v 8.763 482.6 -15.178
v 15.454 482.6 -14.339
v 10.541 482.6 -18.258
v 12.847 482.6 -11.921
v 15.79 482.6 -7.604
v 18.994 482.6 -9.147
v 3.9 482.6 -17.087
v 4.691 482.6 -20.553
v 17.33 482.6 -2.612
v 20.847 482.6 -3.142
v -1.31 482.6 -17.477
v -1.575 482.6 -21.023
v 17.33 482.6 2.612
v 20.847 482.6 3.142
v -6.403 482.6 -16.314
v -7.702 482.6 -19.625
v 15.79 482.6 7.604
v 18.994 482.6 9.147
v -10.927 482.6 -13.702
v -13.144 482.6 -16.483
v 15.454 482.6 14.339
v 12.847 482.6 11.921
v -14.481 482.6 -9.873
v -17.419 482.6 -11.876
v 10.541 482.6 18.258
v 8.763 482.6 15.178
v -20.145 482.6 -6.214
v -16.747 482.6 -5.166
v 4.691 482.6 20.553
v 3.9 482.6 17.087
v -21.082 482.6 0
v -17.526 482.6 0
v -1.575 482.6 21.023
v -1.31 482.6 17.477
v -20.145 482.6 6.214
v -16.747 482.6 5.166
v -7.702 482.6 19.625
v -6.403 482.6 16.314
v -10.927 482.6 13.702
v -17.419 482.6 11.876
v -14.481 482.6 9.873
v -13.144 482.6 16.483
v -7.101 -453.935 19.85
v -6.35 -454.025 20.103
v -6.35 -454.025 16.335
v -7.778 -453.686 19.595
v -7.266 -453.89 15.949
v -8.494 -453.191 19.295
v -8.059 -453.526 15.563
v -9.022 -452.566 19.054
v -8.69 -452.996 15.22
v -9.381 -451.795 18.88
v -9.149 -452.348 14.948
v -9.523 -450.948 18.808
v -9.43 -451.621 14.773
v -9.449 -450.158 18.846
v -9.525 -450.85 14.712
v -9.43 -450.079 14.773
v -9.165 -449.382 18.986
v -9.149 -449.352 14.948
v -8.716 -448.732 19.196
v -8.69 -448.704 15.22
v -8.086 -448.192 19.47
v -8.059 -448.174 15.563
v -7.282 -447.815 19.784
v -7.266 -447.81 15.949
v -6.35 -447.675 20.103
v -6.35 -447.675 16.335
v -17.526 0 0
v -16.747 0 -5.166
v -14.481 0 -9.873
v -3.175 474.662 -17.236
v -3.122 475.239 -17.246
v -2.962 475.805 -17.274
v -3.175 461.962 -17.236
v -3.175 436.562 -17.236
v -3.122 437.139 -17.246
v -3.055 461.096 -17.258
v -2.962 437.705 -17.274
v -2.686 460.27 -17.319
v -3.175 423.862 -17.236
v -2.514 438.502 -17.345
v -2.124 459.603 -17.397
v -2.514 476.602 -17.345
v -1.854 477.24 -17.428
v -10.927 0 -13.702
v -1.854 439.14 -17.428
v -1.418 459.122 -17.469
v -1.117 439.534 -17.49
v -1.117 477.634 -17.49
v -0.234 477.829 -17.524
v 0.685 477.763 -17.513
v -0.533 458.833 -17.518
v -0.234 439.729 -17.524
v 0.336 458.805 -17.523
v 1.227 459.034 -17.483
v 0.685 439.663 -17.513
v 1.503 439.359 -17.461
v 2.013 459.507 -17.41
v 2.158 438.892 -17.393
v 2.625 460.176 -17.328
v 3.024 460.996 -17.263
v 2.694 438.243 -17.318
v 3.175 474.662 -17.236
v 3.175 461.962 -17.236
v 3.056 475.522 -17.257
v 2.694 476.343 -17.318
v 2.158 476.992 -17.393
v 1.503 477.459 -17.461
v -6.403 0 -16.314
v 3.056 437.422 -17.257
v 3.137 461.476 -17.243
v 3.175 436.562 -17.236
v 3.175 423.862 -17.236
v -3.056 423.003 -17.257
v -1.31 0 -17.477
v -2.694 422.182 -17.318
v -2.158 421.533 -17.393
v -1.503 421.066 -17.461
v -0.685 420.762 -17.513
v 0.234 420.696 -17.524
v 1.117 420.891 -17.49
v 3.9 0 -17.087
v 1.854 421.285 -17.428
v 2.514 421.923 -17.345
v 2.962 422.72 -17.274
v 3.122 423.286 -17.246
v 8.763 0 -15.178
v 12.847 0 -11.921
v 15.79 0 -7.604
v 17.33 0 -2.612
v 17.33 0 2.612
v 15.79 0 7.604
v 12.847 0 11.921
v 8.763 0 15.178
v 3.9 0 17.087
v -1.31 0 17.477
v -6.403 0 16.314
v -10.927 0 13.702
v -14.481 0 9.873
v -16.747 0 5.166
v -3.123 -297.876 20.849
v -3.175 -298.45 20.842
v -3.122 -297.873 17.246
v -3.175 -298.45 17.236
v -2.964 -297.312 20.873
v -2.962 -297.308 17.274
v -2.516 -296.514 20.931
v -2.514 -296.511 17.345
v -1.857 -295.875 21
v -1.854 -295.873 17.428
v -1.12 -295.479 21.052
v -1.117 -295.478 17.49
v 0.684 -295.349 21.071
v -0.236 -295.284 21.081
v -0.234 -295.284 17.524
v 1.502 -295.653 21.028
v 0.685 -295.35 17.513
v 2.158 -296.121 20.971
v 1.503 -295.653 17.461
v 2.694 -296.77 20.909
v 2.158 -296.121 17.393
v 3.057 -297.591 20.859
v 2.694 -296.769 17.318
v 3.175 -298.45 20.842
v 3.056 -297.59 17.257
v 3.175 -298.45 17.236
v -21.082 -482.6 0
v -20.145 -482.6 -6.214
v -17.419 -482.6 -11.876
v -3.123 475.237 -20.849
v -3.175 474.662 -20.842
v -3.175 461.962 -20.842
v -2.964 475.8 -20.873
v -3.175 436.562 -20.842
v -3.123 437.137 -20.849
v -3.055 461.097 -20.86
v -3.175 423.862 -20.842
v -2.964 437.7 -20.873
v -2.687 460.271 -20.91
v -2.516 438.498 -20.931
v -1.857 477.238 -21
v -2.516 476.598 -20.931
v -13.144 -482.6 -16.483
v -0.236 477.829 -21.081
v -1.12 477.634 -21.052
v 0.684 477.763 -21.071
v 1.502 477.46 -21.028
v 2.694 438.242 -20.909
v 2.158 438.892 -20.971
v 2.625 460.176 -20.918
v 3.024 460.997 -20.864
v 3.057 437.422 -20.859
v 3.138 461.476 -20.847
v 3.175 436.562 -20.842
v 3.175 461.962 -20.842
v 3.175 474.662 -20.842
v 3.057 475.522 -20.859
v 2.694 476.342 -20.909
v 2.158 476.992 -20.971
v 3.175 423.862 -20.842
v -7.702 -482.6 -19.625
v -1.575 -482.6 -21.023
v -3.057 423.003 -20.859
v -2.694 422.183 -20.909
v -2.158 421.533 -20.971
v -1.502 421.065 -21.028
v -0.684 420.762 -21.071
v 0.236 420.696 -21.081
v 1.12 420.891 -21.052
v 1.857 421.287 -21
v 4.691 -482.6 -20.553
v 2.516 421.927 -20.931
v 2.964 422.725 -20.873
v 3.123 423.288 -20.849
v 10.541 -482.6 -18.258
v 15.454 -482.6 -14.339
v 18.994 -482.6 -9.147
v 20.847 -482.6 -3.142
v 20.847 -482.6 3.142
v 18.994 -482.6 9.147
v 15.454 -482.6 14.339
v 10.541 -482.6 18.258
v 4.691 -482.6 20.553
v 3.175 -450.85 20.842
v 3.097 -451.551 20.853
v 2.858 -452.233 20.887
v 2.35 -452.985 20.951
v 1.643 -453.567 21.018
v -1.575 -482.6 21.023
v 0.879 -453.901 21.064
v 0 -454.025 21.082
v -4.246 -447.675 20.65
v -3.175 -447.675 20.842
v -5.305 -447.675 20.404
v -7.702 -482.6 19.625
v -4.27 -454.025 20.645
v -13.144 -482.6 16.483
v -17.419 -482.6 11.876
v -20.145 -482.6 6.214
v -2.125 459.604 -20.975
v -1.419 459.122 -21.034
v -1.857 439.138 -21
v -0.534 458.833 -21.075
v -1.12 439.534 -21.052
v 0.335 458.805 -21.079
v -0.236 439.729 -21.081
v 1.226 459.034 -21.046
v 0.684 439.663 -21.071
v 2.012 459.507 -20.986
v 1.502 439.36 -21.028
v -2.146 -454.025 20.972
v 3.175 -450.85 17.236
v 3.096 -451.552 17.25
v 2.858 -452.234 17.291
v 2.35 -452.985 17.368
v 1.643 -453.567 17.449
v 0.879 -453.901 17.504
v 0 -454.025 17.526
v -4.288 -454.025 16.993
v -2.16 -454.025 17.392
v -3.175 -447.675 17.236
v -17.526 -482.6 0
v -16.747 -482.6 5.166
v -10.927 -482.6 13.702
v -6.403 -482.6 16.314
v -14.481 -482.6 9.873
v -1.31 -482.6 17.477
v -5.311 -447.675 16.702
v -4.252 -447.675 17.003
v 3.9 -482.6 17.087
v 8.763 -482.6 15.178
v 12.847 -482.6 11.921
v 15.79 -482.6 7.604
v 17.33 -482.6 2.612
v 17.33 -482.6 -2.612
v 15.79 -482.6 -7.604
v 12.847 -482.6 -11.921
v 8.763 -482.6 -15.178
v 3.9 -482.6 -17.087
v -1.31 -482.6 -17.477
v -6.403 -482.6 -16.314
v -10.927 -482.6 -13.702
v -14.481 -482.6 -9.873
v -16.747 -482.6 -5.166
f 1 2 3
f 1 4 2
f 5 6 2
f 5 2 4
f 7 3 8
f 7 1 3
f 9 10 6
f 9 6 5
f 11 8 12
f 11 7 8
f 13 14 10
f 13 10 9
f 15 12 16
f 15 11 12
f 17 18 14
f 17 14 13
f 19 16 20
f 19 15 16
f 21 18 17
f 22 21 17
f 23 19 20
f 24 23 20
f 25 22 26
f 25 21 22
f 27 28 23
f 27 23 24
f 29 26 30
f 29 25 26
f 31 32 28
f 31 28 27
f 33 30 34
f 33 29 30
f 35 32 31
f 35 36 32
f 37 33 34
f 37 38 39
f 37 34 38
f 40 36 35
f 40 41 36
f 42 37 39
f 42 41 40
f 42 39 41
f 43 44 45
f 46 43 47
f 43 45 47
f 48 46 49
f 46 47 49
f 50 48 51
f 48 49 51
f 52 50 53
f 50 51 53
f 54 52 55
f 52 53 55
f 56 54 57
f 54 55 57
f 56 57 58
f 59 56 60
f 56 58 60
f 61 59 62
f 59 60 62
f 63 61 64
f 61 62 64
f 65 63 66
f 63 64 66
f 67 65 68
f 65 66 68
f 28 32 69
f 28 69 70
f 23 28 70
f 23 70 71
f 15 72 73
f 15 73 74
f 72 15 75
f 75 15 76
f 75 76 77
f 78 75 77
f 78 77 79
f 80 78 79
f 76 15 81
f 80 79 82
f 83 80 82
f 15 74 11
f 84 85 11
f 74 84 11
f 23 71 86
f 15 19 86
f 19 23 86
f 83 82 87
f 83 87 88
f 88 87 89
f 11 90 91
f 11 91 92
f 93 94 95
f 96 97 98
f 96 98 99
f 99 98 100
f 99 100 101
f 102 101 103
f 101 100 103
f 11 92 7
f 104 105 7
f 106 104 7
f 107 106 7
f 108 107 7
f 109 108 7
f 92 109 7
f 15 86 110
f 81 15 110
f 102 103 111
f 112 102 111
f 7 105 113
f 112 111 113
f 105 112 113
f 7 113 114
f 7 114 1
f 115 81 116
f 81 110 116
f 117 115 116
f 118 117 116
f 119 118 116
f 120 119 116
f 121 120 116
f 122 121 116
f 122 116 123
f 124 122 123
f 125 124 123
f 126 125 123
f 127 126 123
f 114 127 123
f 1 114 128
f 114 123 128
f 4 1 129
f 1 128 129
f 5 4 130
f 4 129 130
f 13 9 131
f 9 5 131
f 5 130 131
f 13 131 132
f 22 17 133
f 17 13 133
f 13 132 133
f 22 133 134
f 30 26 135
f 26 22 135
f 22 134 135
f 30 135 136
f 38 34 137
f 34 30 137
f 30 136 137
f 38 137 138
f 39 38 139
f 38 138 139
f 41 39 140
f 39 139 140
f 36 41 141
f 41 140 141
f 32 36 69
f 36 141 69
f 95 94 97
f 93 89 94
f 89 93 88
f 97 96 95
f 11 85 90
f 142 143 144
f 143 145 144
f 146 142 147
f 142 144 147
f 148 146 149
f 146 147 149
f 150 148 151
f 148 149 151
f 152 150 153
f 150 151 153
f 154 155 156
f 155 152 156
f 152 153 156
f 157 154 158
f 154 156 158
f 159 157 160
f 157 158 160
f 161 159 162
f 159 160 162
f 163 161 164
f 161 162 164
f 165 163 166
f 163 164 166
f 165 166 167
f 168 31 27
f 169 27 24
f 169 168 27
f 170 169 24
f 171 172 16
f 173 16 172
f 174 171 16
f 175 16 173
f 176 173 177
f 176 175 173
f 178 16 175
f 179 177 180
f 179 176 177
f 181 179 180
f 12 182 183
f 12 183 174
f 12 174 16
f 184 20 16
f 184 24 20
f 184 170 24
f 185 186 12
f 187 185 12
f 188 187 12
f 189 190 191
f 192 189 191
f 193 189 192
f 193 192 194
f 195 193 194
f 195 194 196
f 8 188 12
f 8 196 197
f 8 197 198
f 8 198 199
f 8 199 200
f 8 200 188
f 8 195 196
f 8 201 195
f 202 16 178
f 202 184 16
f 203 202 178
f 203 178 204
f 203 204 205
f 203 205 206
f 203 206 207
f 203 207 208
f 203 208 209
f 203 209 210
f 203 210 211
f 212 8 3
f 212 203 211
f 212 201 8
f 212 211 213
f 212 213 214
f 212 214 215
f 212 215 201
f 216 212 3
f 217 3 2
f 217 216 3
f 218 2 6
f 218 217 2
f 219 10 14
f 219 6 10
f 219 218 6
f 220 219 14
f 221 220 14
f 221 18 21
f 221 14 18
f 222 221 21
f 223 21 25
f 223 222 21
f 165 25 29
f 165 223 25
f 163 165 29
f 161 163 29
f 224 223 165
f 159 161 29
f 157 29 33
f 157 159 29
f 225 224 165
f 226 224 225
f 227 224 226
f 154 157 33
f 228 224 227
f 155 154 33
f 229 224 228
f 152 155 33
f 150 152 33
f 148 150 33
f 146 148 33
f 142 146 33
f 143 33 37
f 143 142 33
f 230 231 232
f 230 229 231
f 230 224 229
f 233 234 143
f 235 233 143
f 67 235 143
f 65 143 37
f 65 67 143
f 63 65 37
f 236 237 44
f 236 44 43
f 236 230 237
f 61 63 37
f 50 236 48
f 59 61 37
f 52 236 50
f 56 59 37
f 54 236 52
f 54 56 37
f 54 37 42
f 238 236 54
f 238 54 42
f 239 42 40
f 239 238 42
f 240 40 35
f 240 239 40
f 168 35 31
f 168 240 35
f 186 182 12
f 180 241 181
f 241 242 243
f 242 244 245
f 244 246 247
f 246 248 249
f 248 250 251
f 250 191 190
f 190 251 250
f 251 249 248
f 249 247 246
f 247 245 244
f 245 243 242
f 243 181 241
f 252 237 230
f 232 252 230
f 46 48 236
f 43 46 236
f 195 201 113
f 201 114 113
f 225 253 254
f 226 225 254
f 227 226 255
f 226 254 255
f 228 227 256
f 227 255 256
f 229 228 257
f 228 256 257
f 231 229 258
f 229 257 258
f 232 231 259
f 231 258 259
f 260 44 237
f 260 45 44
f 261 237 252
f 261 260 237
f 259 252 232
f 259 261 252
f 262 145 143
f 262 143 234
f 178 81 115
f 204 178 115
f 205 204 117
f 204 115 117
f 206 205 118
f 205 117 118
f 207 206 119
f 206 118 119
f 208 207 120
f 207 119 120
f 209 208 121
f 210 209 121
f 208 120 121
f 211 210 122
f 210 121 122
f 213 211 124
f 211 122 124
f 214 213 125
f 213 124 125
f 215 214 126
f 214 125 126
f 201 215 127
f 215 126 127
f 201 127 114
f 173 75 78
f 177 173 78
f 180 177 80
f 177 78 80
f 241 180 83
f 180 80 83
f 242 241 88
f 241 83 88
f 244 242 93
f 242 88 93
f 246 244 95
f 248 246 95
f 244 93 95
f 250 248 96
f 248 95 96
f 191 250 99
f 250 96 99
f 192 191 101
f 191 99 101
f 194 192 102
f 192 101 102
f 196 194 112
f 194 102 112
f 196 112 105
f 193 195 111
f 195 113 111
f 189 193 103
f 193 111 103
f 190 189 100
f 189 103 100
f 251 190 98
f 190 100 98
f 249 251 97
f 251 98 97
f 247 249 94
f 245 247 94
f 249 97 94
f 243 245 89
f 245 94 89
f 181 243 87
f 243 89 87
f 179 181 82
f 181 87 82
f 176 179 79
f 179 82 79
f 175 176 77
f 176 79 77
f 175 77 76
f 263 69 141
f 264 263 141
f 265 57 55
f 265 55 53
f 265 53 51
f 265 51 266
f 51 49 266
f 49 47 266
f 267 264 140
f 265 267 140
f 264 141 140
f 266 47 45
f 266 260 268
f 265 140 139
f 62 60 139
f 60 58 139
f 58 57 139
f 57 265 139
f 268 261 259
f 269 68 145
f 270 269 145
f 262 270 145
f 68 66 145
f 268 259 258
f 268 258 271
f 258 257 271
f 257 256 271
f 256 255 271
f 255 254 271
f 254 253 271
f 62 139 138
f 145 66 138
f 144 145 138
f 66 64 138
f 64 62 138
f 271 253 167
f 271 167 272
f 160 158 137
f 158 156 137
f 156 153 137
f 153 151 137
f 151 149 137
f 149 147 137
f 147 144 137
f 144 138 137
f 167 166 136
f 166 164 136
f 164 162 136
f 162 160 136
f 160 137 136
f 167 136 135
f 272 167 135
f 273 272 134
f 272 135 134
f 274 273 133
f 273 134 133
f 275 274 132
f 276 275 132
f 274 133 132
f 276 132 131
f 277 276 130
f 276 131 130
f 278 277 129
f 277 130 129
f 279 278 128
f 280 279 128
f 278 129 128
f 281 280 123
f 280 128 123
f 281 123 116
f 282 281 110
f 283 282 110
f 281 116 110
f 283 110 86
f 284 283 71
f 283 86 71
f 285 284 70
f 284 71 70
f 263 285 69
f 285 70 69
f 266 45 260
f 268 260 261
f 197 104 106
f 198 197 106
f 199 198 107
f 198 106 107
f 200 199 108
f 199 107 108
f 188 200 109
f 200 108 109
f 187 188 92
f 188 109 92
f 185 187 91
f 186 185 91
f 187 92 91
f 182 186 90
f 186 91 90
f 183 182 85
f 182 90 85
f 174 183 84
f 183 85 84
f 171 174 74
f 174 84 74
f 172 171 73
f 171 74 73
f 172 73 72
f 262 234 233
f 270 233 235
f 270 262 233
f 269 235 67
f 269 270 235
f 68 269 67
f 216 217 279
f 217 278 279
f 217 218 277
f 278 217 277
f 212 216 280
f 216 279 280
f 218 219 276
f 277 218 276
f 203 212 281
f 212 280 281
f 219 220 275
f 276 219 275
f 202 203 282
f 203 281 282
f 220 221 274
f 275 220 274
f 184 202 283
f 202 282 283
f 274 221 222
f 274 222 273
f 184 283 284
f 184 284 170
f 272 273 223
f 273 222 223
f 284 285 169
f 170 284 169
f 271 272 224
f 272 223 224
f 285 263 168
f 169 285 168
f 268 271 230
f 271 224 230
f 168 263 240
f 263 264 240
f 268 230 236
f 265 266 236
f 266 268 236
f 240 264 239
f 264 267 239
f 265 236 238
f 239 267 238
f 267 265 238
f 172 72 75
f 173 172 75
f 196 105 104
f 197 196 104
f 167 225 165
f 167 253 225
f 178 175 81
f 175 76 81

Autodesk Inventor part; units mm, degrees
ref_plane "YZ Plane" through (0, 0, 0) normal (1, 0, 0) x (0, 1, 0)
ref_plane "XZ Plane" through (0, 0, 0) normal (0, 1, 0) x (-1, 0, 0)
ref_plane "XY Plane" through (0, 0, 0) normal (0, 0, 1) x (1, 0, 0)
sketch "Sketch1" plane through (0, 0, 0) normal (0, 1, 0) x (-1, 0, 0)
  circle A0 centre (0, 0) radius 21.082
  circle A1 centre (0, 0) radius 17.526
  dimension "d0" = 42.164
  dimension "d1" = 35.052
extrude "Extrusion1" add sketch "Sketch1" along normal mid plane 965.2
sketch "Sketch3" plane through (0, 0, 0) normal (0, 0, 1) x (1, 0, 0)
  line L0 (0, 474.6625) -> (0, 461.9625) construction
  line L1 (-3.175, 474.6625) -> (-3.175, 461.9625)
  line L2 (3.175, 461.9625) -> (3.175, 474.6625)
  arc A0 (3.175, 474.6625) -> (-3.175, 474.6625) centre (0, 474.6625) ccw
  arc A1 (-3.175, 461.9625) -> (3.175, 461.9625) centre (0, 461.9625) ccw
  line L3 (0, 436.5625) -> (0, 423.8625) construction
  line L4 (-3.175, 436.5625) -> (-3.175, 423.8625)
  line L5 (3.175, 423.8625) -> (3.175, 436.5625)
  arc A2 (3.175, 436.5625) -> (-3.175, 436.5625) centre (0, 436.5625) ccw
  arc A3 (-3.175, 423.8625) -> (3.175, 423.8625) centre (0, 423.8625) ccw
  line L6 (0, -298.45) -> (0, -450.85) construction
  line L7 (-3.175, -298.45) -> (-3.175, -450.85)
  line L8 (3.175, -450.85) -> (3.175, -298.45)
  arc A4 (3.175, -298.45) -> (-3.175, -298.45) centre (0, -298.45) ccw
  arc A5 (-3.175, -450.85) -> (3.175, -450.85) centre (0, -450.85) ccw
  line L9 (0, -450.85) -> (-6.35, -450.85) construction
  line L10 (0, -447.675) -> (-6.35, -447.675)
  line L11 (-6.35, -454.025) -> (0, -454.025)
  arc A6 (0, -454.025) -> (0, -447.675) centre (0, -450.85) ccw
  arc A7 (-6.35, -447.675) -> (-6.35, -454.025) centre (-6.35, -450.85) ccw
  line L12 (-21.082, -482.6) -> (21.082, -482.6) projected
  line L13 (21.082, 482.6) -> (-21.082, 482.6) projected
  point P0 (0, 468.3125)
  point P1 (0, 430.2125)
  point P2 (0, -374.65)
  point P3 (-3.175, -450.85)
  point P4 (0, -482.6)
  point P5 (-3.175, -447.675)
  dimension "d17" = 3.175
  dimension "d18" = 12.7
  dimension "d19" = 6.35
  dimension "d20" = 152.4
  dimension "d21" = 28.575
  dimension "d22" = 25.4
  dimension "d23" = 7.9375
extrude "Extrusion3" cut sketch "Sketch3" against normal through all contours A0 L2 A1 L1 | A2 L5 A3 L4
extrude "Extrusion4" cut sketch "Sketch3" along normal blind 25.4 contours A4 L8 A6 L10 L7 | L10 A6 A5 L7 | L7 A5 L11 A7 L10
properties part number "FE-120-007 Door Tube" material "Aluminum 6061"
